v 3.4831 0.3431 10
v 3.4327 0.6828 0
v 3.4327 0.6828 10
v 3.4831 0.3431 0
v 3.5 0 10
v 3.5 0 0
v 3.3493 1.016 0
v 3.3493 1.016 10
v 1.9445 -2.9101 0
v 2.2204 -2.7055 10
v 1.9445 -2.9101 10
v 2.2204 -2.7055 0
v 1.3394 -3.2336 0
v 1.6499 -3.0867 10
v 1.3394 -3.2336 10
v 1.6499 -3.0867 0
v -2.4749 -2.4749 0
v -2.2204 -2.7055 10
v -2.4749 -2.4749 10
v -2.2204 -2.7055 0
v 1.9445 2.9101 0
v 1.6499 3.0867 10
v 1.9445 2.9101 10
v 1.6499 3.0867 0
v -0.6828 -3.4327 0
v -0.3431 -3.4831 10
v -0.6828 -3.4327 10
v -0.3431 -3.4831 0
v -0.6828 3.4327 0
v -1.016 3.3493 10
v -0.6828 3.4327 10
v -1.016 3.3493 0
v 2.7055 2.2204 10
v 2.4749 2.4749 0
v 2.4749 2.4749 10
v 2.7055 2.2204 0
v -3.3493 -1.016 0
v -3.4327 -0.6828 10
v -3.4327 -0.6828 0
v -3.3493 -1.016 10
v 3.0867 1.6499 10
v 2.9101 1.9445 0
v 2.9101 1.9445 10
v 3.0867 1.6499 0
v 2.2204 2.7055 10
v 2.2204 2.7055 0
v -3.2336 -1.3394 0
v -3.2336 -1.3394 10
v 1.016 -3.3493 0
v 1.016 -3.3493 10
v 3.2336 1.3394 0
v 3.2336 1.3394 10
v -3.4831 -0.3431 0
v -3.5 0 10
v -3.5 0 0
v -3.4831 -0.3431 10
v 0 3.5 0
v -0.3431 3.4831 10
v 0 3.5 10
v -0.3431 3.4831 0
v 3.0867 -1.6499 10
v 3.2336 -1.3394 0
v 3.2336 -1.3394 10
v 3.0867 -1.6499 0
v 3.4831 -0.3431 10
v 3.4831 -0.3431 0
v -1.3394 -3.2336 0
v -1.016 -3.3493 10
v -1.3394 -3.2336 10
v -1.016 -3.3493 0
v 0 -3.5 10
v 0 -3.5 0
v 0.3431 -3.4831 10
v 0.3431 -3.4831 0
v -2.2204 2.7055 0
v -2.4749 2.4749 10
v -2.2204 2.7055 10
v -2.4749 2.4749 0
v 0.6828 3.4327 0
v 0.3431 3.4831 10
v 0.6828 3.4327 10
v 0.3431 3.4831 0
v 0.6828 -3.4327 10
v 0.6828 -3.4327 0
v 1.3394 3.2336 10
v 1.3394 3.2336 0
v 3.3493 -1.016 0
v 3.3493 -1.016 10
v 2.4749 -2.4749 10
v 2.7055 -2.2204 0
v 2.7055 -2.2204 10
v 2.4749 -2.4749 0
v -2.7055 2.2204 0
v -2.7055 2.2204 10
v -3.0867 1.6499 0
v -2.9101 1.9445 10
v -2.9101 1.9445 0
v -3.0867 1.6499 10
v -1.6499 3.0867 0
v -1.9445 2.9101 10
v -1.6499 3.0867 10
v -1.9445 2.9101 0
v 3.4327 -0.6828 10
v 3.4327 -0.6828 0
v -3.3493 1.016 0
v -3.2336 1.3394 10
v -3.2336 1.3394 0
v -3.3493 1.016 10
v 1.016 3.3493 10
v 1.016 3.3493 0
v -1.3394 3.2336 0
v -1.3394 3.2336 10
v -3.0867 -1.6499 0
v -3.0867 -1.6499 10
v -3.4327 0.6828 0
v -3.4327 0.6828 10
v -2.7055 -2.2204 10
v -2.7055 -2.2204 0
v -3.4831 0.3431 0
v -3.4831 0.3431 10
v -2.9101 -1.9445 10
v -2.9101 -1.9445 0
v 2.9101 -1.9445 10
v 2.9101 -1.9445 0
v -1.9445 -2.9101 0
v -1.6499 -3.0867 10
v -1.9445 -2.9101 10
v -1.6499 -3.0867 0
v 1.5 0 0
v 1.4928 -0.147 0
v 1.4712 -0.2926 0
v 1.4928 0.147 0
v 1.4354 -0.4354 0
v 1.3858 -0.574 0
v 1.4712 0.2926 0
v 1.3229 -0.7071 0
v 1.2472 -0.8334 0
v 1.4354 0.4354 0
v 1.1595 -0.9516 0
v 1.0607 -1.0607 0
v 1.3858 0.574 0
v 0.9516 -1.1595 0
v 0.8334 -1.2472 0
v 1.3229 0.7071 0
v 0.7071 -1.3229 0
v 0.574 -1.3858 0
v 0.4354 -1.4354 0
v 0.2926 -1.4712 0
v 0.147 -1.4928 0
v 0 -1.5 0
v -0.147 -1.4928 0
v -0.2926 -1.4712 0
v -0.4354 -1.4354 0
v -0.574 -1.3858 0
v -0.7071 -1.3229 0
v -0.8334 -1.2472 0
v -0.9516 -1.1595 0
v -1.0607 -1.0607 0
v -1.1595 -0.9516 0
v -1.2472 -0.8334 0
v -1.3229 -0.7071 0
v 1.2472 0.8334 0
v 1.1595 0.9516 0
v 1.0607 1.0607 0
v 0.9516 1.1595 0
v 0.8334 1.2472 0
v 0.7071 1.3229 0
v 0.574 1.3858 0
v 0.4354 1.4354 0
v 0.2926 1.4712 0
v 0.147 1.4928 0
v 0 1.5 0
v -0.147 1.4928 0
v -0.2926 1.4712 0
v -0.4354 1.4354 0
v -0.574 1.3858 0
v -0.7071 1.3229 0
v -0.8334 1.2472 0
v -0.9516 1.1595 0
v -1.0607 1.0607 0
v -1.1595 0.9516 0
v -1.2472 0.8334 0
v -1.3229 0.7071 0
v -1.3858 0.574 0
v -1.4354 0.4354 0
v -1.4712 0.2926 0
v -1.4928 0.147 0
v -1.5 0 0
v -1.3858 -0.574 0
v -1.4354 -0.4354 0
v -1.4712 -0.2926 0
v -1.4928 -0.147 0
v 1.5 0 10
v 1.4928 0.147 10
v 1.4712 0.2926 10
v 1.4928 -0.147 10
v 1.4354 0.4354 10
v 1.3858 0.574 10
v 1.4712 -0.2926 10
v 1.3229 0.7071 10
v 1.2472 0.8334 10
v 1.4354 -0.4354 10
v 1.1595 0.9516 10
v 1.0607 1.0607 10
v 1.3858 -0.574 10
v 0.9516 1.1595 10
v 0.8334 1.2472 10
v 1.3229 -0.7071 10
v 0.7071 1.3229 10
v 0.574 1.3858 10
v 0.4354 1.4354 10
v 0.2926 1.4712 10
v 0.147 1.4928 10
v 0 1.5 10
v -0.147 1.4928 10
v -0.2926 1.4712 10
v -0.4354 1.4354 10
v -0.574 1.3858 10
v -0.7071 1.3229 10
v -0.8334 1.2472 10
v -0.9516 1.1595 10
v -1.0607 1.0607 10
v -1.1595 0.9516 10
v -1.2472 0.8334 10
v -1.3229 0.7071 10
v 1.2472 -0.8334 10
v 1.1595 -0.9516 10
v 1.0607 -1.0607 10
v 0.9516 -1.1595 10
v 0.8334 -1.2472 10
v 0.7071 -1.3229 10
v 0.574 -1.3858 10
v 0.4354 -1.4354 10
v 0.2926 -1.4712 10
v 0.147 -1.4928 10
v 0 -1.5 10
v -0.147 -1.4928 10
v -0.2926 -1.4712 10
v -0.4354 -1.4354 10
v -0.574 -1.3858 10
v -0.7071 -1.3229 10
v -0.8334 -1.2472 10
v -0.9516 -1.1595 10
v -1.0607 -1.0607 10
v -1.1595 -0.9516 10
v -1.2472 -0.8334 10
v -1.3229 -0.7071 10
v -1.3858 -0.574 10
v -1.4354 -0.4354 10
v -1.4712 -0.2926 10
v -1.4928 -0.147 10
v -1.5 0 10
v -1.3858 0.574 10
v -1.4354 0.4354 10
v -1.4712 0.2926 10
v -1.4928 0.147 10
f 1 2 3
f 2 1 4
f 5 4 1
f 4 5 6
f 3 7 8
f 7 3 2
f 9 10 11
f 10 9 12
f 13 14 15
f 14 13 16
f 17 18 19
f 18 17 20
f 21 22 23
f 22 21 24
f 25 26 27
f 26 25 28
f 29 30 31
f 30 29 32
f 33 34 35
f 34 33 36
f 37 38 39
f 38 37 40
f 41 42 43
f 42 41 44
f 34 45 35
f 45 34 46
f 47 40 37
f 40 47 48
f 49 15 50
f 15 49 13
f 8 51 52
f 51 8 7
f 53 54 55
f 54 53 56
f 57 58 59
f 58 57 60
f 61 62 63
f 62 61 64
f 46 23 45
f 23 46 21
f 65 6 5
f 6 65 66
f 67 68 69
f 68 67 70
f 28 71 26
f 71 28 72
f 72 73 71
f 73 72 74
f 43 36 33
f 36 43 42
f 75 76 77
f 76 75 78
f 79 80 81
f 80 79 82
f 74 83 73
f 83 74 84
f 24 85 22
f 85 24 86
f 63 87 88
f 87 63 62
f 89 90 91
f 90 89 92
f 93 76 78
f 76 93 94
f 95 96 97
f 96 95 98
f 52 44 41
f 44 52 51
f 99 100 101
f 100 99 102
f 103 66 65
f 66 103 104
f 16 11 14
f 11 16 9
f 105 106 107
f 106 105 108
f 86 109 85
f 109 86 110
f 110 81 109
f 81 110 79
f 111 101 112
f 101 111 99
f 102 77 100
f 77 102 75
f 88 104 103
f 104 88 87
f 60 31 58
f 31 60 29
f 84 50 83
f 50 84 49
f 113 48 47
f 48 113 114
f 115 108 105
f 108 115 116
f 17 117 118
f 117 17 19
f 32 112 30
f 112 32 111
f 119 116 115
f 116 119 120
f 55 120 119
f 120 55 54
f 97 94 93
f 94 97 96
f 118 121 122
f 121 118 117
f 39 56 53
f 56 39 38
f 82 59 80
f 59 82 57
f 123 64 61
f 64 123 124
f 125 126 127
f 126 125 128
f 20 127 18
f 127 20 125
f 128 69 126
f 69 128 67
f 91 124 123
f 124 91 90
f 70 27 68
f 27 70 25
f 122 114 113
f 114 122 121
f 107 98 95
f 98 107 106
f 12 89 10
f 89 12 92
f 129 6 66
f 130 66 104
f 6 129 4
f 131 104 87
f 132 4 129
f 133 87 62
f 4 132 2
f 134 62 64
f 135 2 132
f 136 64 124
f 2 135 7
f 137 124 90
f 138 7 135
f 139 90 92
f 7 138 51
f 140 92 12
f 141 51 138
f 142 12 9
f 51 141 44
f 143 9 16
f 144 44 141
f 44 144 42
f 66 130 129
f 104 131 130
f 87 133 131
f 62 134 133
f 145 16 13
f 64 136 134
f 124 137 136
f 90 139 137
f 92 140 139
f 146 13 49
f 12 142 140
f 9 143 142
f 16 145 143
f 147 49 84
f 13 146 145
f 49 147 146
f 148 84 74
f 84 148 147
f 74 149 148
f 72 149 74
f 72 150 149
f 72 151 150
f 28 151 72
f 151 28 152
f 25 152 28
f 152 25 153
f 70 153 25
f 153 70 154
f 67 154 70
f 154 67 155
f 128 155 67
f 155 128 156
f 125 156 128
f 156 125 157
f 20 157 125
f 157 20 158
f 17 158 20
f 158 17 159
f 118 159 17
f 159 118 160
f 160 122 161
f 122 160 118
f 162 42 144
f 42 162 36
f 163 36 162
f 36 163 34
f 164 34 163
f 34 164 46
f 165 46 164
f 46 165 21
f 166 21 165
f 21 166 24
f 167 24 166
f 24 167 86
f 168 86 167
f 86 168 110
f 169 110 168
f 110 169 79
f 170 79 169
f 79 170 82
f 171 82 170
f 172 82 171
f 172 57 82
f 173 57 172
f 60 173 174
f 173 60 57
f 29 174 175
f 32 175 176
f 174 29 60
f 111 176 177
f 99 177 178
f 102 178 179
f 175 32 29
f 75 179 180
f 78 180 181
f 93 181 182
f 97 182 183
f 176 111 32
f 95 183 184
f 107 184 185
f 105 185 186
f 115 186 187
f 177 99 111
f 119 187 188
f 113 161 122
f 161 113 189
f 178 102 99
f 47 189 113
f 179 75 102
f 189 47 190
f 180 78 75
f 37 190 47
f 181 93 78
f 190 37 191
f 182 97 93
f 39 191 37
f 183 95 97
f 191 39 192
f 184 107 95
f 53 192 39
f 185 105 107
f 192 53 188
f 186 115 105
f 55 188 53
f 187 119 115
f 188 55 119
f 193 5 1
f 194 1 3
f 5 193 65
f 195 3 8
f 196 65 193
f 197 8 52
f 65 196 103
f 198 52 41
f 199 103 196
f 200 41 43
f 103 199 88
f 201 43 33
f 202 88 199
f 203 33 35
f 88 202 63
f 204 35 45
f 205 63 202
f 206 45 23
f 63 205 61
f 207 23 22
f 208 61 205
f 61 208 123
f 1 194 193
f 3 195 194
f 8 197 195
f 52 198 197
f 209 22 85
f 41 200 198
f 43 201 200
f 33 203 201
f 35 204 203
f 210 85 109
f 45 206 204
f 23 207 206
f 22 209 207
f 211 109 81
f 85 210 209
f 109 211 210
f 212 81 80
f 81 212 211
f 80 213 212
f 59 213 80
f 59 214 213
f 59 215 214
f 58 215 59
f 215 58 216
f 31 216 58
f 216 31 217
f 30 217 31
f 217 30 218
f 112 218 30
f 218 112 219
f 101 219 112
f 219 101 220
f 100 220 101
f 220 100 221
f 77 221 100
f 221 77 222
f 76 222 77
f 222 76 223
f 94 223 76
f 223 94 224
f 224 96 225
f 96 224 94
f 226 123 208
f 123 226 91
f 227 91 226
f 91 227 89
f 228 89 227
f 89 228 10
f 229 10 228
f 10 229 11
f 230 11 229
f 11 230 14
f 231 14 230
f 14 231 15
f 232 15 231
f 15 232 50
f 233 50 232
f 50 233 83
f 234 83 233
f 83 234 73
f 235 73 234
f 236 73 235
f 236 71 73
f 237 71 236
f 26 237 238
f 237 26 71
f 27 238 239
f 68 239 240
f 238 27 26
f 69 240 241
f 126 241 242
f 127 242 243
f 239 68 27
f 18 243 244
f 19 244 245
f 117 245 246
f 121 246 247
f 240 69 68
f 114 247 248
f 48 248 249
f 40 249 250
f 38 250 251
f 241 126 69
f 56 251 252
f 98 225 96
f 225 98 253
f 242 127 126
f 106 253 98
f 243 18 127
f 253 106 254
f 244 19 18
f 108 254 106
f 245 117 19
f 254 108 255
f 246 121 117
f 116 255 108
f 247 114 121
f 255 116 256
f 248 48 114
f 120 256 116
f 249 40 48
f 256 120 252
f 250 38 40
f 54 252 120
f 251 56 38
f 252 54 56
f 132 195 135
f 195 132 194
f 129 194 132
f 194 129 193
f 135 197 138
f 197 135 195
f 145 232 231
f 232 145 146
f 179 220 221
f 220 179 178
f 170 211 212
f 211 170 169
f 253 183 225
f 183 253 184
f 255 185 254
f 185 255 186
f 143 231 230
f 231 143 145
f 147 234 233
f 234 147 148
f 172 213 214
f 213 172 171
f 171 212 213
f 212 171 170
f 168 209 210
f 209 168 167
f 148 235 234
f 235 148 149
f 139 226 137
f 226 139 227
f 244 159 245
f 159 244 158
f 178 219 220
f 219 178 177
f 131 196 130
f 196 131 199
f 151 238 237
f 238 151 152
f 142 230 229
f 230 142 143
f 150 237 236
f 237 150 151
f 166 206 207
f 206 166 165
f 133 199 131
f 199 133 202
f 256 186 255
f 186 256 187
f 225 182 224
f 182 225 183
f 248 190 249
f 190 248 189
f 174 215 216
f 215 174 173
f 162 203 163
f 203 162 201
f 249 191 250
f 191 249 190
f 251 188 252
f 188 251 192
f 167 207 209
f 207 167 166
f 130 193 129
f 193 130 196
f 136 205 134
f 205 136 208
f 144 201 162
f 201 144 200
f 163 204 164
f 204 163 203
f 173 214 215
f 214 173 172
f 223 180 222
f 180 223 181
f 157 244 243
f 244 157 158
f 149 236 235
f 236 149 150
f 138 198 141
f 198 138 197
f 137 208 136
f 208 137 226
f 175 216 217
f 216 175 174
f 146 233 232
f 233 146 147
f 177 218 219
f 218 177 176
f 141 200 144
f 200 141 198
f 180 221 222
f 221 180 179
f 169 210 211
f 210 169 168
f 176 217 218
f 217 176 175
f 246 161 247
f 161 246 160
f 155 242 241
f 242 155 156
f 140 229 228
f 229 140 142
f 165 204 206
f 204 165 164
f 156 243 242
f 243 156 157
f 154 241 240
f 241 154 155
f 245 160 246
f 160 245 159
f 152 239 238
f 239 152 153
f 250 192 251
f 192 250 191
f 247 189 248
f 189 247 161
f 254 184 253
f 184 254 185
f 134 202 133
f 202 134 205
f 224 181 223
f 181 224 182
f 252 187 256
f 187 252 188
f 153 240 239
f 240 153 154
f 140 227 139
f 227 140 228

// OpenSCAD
module linear_bearing() {
    difference() {
        // Outer cylinder
        cylinder(h=10.0, d=7.0, $fn=64);
        // Inner bore
        translate([0, 0, -1]) // Ensure the bore goes through completely
        cylinder(h=12.0, d=3.0, $fn=64);
    }
}

linear_bearing();
